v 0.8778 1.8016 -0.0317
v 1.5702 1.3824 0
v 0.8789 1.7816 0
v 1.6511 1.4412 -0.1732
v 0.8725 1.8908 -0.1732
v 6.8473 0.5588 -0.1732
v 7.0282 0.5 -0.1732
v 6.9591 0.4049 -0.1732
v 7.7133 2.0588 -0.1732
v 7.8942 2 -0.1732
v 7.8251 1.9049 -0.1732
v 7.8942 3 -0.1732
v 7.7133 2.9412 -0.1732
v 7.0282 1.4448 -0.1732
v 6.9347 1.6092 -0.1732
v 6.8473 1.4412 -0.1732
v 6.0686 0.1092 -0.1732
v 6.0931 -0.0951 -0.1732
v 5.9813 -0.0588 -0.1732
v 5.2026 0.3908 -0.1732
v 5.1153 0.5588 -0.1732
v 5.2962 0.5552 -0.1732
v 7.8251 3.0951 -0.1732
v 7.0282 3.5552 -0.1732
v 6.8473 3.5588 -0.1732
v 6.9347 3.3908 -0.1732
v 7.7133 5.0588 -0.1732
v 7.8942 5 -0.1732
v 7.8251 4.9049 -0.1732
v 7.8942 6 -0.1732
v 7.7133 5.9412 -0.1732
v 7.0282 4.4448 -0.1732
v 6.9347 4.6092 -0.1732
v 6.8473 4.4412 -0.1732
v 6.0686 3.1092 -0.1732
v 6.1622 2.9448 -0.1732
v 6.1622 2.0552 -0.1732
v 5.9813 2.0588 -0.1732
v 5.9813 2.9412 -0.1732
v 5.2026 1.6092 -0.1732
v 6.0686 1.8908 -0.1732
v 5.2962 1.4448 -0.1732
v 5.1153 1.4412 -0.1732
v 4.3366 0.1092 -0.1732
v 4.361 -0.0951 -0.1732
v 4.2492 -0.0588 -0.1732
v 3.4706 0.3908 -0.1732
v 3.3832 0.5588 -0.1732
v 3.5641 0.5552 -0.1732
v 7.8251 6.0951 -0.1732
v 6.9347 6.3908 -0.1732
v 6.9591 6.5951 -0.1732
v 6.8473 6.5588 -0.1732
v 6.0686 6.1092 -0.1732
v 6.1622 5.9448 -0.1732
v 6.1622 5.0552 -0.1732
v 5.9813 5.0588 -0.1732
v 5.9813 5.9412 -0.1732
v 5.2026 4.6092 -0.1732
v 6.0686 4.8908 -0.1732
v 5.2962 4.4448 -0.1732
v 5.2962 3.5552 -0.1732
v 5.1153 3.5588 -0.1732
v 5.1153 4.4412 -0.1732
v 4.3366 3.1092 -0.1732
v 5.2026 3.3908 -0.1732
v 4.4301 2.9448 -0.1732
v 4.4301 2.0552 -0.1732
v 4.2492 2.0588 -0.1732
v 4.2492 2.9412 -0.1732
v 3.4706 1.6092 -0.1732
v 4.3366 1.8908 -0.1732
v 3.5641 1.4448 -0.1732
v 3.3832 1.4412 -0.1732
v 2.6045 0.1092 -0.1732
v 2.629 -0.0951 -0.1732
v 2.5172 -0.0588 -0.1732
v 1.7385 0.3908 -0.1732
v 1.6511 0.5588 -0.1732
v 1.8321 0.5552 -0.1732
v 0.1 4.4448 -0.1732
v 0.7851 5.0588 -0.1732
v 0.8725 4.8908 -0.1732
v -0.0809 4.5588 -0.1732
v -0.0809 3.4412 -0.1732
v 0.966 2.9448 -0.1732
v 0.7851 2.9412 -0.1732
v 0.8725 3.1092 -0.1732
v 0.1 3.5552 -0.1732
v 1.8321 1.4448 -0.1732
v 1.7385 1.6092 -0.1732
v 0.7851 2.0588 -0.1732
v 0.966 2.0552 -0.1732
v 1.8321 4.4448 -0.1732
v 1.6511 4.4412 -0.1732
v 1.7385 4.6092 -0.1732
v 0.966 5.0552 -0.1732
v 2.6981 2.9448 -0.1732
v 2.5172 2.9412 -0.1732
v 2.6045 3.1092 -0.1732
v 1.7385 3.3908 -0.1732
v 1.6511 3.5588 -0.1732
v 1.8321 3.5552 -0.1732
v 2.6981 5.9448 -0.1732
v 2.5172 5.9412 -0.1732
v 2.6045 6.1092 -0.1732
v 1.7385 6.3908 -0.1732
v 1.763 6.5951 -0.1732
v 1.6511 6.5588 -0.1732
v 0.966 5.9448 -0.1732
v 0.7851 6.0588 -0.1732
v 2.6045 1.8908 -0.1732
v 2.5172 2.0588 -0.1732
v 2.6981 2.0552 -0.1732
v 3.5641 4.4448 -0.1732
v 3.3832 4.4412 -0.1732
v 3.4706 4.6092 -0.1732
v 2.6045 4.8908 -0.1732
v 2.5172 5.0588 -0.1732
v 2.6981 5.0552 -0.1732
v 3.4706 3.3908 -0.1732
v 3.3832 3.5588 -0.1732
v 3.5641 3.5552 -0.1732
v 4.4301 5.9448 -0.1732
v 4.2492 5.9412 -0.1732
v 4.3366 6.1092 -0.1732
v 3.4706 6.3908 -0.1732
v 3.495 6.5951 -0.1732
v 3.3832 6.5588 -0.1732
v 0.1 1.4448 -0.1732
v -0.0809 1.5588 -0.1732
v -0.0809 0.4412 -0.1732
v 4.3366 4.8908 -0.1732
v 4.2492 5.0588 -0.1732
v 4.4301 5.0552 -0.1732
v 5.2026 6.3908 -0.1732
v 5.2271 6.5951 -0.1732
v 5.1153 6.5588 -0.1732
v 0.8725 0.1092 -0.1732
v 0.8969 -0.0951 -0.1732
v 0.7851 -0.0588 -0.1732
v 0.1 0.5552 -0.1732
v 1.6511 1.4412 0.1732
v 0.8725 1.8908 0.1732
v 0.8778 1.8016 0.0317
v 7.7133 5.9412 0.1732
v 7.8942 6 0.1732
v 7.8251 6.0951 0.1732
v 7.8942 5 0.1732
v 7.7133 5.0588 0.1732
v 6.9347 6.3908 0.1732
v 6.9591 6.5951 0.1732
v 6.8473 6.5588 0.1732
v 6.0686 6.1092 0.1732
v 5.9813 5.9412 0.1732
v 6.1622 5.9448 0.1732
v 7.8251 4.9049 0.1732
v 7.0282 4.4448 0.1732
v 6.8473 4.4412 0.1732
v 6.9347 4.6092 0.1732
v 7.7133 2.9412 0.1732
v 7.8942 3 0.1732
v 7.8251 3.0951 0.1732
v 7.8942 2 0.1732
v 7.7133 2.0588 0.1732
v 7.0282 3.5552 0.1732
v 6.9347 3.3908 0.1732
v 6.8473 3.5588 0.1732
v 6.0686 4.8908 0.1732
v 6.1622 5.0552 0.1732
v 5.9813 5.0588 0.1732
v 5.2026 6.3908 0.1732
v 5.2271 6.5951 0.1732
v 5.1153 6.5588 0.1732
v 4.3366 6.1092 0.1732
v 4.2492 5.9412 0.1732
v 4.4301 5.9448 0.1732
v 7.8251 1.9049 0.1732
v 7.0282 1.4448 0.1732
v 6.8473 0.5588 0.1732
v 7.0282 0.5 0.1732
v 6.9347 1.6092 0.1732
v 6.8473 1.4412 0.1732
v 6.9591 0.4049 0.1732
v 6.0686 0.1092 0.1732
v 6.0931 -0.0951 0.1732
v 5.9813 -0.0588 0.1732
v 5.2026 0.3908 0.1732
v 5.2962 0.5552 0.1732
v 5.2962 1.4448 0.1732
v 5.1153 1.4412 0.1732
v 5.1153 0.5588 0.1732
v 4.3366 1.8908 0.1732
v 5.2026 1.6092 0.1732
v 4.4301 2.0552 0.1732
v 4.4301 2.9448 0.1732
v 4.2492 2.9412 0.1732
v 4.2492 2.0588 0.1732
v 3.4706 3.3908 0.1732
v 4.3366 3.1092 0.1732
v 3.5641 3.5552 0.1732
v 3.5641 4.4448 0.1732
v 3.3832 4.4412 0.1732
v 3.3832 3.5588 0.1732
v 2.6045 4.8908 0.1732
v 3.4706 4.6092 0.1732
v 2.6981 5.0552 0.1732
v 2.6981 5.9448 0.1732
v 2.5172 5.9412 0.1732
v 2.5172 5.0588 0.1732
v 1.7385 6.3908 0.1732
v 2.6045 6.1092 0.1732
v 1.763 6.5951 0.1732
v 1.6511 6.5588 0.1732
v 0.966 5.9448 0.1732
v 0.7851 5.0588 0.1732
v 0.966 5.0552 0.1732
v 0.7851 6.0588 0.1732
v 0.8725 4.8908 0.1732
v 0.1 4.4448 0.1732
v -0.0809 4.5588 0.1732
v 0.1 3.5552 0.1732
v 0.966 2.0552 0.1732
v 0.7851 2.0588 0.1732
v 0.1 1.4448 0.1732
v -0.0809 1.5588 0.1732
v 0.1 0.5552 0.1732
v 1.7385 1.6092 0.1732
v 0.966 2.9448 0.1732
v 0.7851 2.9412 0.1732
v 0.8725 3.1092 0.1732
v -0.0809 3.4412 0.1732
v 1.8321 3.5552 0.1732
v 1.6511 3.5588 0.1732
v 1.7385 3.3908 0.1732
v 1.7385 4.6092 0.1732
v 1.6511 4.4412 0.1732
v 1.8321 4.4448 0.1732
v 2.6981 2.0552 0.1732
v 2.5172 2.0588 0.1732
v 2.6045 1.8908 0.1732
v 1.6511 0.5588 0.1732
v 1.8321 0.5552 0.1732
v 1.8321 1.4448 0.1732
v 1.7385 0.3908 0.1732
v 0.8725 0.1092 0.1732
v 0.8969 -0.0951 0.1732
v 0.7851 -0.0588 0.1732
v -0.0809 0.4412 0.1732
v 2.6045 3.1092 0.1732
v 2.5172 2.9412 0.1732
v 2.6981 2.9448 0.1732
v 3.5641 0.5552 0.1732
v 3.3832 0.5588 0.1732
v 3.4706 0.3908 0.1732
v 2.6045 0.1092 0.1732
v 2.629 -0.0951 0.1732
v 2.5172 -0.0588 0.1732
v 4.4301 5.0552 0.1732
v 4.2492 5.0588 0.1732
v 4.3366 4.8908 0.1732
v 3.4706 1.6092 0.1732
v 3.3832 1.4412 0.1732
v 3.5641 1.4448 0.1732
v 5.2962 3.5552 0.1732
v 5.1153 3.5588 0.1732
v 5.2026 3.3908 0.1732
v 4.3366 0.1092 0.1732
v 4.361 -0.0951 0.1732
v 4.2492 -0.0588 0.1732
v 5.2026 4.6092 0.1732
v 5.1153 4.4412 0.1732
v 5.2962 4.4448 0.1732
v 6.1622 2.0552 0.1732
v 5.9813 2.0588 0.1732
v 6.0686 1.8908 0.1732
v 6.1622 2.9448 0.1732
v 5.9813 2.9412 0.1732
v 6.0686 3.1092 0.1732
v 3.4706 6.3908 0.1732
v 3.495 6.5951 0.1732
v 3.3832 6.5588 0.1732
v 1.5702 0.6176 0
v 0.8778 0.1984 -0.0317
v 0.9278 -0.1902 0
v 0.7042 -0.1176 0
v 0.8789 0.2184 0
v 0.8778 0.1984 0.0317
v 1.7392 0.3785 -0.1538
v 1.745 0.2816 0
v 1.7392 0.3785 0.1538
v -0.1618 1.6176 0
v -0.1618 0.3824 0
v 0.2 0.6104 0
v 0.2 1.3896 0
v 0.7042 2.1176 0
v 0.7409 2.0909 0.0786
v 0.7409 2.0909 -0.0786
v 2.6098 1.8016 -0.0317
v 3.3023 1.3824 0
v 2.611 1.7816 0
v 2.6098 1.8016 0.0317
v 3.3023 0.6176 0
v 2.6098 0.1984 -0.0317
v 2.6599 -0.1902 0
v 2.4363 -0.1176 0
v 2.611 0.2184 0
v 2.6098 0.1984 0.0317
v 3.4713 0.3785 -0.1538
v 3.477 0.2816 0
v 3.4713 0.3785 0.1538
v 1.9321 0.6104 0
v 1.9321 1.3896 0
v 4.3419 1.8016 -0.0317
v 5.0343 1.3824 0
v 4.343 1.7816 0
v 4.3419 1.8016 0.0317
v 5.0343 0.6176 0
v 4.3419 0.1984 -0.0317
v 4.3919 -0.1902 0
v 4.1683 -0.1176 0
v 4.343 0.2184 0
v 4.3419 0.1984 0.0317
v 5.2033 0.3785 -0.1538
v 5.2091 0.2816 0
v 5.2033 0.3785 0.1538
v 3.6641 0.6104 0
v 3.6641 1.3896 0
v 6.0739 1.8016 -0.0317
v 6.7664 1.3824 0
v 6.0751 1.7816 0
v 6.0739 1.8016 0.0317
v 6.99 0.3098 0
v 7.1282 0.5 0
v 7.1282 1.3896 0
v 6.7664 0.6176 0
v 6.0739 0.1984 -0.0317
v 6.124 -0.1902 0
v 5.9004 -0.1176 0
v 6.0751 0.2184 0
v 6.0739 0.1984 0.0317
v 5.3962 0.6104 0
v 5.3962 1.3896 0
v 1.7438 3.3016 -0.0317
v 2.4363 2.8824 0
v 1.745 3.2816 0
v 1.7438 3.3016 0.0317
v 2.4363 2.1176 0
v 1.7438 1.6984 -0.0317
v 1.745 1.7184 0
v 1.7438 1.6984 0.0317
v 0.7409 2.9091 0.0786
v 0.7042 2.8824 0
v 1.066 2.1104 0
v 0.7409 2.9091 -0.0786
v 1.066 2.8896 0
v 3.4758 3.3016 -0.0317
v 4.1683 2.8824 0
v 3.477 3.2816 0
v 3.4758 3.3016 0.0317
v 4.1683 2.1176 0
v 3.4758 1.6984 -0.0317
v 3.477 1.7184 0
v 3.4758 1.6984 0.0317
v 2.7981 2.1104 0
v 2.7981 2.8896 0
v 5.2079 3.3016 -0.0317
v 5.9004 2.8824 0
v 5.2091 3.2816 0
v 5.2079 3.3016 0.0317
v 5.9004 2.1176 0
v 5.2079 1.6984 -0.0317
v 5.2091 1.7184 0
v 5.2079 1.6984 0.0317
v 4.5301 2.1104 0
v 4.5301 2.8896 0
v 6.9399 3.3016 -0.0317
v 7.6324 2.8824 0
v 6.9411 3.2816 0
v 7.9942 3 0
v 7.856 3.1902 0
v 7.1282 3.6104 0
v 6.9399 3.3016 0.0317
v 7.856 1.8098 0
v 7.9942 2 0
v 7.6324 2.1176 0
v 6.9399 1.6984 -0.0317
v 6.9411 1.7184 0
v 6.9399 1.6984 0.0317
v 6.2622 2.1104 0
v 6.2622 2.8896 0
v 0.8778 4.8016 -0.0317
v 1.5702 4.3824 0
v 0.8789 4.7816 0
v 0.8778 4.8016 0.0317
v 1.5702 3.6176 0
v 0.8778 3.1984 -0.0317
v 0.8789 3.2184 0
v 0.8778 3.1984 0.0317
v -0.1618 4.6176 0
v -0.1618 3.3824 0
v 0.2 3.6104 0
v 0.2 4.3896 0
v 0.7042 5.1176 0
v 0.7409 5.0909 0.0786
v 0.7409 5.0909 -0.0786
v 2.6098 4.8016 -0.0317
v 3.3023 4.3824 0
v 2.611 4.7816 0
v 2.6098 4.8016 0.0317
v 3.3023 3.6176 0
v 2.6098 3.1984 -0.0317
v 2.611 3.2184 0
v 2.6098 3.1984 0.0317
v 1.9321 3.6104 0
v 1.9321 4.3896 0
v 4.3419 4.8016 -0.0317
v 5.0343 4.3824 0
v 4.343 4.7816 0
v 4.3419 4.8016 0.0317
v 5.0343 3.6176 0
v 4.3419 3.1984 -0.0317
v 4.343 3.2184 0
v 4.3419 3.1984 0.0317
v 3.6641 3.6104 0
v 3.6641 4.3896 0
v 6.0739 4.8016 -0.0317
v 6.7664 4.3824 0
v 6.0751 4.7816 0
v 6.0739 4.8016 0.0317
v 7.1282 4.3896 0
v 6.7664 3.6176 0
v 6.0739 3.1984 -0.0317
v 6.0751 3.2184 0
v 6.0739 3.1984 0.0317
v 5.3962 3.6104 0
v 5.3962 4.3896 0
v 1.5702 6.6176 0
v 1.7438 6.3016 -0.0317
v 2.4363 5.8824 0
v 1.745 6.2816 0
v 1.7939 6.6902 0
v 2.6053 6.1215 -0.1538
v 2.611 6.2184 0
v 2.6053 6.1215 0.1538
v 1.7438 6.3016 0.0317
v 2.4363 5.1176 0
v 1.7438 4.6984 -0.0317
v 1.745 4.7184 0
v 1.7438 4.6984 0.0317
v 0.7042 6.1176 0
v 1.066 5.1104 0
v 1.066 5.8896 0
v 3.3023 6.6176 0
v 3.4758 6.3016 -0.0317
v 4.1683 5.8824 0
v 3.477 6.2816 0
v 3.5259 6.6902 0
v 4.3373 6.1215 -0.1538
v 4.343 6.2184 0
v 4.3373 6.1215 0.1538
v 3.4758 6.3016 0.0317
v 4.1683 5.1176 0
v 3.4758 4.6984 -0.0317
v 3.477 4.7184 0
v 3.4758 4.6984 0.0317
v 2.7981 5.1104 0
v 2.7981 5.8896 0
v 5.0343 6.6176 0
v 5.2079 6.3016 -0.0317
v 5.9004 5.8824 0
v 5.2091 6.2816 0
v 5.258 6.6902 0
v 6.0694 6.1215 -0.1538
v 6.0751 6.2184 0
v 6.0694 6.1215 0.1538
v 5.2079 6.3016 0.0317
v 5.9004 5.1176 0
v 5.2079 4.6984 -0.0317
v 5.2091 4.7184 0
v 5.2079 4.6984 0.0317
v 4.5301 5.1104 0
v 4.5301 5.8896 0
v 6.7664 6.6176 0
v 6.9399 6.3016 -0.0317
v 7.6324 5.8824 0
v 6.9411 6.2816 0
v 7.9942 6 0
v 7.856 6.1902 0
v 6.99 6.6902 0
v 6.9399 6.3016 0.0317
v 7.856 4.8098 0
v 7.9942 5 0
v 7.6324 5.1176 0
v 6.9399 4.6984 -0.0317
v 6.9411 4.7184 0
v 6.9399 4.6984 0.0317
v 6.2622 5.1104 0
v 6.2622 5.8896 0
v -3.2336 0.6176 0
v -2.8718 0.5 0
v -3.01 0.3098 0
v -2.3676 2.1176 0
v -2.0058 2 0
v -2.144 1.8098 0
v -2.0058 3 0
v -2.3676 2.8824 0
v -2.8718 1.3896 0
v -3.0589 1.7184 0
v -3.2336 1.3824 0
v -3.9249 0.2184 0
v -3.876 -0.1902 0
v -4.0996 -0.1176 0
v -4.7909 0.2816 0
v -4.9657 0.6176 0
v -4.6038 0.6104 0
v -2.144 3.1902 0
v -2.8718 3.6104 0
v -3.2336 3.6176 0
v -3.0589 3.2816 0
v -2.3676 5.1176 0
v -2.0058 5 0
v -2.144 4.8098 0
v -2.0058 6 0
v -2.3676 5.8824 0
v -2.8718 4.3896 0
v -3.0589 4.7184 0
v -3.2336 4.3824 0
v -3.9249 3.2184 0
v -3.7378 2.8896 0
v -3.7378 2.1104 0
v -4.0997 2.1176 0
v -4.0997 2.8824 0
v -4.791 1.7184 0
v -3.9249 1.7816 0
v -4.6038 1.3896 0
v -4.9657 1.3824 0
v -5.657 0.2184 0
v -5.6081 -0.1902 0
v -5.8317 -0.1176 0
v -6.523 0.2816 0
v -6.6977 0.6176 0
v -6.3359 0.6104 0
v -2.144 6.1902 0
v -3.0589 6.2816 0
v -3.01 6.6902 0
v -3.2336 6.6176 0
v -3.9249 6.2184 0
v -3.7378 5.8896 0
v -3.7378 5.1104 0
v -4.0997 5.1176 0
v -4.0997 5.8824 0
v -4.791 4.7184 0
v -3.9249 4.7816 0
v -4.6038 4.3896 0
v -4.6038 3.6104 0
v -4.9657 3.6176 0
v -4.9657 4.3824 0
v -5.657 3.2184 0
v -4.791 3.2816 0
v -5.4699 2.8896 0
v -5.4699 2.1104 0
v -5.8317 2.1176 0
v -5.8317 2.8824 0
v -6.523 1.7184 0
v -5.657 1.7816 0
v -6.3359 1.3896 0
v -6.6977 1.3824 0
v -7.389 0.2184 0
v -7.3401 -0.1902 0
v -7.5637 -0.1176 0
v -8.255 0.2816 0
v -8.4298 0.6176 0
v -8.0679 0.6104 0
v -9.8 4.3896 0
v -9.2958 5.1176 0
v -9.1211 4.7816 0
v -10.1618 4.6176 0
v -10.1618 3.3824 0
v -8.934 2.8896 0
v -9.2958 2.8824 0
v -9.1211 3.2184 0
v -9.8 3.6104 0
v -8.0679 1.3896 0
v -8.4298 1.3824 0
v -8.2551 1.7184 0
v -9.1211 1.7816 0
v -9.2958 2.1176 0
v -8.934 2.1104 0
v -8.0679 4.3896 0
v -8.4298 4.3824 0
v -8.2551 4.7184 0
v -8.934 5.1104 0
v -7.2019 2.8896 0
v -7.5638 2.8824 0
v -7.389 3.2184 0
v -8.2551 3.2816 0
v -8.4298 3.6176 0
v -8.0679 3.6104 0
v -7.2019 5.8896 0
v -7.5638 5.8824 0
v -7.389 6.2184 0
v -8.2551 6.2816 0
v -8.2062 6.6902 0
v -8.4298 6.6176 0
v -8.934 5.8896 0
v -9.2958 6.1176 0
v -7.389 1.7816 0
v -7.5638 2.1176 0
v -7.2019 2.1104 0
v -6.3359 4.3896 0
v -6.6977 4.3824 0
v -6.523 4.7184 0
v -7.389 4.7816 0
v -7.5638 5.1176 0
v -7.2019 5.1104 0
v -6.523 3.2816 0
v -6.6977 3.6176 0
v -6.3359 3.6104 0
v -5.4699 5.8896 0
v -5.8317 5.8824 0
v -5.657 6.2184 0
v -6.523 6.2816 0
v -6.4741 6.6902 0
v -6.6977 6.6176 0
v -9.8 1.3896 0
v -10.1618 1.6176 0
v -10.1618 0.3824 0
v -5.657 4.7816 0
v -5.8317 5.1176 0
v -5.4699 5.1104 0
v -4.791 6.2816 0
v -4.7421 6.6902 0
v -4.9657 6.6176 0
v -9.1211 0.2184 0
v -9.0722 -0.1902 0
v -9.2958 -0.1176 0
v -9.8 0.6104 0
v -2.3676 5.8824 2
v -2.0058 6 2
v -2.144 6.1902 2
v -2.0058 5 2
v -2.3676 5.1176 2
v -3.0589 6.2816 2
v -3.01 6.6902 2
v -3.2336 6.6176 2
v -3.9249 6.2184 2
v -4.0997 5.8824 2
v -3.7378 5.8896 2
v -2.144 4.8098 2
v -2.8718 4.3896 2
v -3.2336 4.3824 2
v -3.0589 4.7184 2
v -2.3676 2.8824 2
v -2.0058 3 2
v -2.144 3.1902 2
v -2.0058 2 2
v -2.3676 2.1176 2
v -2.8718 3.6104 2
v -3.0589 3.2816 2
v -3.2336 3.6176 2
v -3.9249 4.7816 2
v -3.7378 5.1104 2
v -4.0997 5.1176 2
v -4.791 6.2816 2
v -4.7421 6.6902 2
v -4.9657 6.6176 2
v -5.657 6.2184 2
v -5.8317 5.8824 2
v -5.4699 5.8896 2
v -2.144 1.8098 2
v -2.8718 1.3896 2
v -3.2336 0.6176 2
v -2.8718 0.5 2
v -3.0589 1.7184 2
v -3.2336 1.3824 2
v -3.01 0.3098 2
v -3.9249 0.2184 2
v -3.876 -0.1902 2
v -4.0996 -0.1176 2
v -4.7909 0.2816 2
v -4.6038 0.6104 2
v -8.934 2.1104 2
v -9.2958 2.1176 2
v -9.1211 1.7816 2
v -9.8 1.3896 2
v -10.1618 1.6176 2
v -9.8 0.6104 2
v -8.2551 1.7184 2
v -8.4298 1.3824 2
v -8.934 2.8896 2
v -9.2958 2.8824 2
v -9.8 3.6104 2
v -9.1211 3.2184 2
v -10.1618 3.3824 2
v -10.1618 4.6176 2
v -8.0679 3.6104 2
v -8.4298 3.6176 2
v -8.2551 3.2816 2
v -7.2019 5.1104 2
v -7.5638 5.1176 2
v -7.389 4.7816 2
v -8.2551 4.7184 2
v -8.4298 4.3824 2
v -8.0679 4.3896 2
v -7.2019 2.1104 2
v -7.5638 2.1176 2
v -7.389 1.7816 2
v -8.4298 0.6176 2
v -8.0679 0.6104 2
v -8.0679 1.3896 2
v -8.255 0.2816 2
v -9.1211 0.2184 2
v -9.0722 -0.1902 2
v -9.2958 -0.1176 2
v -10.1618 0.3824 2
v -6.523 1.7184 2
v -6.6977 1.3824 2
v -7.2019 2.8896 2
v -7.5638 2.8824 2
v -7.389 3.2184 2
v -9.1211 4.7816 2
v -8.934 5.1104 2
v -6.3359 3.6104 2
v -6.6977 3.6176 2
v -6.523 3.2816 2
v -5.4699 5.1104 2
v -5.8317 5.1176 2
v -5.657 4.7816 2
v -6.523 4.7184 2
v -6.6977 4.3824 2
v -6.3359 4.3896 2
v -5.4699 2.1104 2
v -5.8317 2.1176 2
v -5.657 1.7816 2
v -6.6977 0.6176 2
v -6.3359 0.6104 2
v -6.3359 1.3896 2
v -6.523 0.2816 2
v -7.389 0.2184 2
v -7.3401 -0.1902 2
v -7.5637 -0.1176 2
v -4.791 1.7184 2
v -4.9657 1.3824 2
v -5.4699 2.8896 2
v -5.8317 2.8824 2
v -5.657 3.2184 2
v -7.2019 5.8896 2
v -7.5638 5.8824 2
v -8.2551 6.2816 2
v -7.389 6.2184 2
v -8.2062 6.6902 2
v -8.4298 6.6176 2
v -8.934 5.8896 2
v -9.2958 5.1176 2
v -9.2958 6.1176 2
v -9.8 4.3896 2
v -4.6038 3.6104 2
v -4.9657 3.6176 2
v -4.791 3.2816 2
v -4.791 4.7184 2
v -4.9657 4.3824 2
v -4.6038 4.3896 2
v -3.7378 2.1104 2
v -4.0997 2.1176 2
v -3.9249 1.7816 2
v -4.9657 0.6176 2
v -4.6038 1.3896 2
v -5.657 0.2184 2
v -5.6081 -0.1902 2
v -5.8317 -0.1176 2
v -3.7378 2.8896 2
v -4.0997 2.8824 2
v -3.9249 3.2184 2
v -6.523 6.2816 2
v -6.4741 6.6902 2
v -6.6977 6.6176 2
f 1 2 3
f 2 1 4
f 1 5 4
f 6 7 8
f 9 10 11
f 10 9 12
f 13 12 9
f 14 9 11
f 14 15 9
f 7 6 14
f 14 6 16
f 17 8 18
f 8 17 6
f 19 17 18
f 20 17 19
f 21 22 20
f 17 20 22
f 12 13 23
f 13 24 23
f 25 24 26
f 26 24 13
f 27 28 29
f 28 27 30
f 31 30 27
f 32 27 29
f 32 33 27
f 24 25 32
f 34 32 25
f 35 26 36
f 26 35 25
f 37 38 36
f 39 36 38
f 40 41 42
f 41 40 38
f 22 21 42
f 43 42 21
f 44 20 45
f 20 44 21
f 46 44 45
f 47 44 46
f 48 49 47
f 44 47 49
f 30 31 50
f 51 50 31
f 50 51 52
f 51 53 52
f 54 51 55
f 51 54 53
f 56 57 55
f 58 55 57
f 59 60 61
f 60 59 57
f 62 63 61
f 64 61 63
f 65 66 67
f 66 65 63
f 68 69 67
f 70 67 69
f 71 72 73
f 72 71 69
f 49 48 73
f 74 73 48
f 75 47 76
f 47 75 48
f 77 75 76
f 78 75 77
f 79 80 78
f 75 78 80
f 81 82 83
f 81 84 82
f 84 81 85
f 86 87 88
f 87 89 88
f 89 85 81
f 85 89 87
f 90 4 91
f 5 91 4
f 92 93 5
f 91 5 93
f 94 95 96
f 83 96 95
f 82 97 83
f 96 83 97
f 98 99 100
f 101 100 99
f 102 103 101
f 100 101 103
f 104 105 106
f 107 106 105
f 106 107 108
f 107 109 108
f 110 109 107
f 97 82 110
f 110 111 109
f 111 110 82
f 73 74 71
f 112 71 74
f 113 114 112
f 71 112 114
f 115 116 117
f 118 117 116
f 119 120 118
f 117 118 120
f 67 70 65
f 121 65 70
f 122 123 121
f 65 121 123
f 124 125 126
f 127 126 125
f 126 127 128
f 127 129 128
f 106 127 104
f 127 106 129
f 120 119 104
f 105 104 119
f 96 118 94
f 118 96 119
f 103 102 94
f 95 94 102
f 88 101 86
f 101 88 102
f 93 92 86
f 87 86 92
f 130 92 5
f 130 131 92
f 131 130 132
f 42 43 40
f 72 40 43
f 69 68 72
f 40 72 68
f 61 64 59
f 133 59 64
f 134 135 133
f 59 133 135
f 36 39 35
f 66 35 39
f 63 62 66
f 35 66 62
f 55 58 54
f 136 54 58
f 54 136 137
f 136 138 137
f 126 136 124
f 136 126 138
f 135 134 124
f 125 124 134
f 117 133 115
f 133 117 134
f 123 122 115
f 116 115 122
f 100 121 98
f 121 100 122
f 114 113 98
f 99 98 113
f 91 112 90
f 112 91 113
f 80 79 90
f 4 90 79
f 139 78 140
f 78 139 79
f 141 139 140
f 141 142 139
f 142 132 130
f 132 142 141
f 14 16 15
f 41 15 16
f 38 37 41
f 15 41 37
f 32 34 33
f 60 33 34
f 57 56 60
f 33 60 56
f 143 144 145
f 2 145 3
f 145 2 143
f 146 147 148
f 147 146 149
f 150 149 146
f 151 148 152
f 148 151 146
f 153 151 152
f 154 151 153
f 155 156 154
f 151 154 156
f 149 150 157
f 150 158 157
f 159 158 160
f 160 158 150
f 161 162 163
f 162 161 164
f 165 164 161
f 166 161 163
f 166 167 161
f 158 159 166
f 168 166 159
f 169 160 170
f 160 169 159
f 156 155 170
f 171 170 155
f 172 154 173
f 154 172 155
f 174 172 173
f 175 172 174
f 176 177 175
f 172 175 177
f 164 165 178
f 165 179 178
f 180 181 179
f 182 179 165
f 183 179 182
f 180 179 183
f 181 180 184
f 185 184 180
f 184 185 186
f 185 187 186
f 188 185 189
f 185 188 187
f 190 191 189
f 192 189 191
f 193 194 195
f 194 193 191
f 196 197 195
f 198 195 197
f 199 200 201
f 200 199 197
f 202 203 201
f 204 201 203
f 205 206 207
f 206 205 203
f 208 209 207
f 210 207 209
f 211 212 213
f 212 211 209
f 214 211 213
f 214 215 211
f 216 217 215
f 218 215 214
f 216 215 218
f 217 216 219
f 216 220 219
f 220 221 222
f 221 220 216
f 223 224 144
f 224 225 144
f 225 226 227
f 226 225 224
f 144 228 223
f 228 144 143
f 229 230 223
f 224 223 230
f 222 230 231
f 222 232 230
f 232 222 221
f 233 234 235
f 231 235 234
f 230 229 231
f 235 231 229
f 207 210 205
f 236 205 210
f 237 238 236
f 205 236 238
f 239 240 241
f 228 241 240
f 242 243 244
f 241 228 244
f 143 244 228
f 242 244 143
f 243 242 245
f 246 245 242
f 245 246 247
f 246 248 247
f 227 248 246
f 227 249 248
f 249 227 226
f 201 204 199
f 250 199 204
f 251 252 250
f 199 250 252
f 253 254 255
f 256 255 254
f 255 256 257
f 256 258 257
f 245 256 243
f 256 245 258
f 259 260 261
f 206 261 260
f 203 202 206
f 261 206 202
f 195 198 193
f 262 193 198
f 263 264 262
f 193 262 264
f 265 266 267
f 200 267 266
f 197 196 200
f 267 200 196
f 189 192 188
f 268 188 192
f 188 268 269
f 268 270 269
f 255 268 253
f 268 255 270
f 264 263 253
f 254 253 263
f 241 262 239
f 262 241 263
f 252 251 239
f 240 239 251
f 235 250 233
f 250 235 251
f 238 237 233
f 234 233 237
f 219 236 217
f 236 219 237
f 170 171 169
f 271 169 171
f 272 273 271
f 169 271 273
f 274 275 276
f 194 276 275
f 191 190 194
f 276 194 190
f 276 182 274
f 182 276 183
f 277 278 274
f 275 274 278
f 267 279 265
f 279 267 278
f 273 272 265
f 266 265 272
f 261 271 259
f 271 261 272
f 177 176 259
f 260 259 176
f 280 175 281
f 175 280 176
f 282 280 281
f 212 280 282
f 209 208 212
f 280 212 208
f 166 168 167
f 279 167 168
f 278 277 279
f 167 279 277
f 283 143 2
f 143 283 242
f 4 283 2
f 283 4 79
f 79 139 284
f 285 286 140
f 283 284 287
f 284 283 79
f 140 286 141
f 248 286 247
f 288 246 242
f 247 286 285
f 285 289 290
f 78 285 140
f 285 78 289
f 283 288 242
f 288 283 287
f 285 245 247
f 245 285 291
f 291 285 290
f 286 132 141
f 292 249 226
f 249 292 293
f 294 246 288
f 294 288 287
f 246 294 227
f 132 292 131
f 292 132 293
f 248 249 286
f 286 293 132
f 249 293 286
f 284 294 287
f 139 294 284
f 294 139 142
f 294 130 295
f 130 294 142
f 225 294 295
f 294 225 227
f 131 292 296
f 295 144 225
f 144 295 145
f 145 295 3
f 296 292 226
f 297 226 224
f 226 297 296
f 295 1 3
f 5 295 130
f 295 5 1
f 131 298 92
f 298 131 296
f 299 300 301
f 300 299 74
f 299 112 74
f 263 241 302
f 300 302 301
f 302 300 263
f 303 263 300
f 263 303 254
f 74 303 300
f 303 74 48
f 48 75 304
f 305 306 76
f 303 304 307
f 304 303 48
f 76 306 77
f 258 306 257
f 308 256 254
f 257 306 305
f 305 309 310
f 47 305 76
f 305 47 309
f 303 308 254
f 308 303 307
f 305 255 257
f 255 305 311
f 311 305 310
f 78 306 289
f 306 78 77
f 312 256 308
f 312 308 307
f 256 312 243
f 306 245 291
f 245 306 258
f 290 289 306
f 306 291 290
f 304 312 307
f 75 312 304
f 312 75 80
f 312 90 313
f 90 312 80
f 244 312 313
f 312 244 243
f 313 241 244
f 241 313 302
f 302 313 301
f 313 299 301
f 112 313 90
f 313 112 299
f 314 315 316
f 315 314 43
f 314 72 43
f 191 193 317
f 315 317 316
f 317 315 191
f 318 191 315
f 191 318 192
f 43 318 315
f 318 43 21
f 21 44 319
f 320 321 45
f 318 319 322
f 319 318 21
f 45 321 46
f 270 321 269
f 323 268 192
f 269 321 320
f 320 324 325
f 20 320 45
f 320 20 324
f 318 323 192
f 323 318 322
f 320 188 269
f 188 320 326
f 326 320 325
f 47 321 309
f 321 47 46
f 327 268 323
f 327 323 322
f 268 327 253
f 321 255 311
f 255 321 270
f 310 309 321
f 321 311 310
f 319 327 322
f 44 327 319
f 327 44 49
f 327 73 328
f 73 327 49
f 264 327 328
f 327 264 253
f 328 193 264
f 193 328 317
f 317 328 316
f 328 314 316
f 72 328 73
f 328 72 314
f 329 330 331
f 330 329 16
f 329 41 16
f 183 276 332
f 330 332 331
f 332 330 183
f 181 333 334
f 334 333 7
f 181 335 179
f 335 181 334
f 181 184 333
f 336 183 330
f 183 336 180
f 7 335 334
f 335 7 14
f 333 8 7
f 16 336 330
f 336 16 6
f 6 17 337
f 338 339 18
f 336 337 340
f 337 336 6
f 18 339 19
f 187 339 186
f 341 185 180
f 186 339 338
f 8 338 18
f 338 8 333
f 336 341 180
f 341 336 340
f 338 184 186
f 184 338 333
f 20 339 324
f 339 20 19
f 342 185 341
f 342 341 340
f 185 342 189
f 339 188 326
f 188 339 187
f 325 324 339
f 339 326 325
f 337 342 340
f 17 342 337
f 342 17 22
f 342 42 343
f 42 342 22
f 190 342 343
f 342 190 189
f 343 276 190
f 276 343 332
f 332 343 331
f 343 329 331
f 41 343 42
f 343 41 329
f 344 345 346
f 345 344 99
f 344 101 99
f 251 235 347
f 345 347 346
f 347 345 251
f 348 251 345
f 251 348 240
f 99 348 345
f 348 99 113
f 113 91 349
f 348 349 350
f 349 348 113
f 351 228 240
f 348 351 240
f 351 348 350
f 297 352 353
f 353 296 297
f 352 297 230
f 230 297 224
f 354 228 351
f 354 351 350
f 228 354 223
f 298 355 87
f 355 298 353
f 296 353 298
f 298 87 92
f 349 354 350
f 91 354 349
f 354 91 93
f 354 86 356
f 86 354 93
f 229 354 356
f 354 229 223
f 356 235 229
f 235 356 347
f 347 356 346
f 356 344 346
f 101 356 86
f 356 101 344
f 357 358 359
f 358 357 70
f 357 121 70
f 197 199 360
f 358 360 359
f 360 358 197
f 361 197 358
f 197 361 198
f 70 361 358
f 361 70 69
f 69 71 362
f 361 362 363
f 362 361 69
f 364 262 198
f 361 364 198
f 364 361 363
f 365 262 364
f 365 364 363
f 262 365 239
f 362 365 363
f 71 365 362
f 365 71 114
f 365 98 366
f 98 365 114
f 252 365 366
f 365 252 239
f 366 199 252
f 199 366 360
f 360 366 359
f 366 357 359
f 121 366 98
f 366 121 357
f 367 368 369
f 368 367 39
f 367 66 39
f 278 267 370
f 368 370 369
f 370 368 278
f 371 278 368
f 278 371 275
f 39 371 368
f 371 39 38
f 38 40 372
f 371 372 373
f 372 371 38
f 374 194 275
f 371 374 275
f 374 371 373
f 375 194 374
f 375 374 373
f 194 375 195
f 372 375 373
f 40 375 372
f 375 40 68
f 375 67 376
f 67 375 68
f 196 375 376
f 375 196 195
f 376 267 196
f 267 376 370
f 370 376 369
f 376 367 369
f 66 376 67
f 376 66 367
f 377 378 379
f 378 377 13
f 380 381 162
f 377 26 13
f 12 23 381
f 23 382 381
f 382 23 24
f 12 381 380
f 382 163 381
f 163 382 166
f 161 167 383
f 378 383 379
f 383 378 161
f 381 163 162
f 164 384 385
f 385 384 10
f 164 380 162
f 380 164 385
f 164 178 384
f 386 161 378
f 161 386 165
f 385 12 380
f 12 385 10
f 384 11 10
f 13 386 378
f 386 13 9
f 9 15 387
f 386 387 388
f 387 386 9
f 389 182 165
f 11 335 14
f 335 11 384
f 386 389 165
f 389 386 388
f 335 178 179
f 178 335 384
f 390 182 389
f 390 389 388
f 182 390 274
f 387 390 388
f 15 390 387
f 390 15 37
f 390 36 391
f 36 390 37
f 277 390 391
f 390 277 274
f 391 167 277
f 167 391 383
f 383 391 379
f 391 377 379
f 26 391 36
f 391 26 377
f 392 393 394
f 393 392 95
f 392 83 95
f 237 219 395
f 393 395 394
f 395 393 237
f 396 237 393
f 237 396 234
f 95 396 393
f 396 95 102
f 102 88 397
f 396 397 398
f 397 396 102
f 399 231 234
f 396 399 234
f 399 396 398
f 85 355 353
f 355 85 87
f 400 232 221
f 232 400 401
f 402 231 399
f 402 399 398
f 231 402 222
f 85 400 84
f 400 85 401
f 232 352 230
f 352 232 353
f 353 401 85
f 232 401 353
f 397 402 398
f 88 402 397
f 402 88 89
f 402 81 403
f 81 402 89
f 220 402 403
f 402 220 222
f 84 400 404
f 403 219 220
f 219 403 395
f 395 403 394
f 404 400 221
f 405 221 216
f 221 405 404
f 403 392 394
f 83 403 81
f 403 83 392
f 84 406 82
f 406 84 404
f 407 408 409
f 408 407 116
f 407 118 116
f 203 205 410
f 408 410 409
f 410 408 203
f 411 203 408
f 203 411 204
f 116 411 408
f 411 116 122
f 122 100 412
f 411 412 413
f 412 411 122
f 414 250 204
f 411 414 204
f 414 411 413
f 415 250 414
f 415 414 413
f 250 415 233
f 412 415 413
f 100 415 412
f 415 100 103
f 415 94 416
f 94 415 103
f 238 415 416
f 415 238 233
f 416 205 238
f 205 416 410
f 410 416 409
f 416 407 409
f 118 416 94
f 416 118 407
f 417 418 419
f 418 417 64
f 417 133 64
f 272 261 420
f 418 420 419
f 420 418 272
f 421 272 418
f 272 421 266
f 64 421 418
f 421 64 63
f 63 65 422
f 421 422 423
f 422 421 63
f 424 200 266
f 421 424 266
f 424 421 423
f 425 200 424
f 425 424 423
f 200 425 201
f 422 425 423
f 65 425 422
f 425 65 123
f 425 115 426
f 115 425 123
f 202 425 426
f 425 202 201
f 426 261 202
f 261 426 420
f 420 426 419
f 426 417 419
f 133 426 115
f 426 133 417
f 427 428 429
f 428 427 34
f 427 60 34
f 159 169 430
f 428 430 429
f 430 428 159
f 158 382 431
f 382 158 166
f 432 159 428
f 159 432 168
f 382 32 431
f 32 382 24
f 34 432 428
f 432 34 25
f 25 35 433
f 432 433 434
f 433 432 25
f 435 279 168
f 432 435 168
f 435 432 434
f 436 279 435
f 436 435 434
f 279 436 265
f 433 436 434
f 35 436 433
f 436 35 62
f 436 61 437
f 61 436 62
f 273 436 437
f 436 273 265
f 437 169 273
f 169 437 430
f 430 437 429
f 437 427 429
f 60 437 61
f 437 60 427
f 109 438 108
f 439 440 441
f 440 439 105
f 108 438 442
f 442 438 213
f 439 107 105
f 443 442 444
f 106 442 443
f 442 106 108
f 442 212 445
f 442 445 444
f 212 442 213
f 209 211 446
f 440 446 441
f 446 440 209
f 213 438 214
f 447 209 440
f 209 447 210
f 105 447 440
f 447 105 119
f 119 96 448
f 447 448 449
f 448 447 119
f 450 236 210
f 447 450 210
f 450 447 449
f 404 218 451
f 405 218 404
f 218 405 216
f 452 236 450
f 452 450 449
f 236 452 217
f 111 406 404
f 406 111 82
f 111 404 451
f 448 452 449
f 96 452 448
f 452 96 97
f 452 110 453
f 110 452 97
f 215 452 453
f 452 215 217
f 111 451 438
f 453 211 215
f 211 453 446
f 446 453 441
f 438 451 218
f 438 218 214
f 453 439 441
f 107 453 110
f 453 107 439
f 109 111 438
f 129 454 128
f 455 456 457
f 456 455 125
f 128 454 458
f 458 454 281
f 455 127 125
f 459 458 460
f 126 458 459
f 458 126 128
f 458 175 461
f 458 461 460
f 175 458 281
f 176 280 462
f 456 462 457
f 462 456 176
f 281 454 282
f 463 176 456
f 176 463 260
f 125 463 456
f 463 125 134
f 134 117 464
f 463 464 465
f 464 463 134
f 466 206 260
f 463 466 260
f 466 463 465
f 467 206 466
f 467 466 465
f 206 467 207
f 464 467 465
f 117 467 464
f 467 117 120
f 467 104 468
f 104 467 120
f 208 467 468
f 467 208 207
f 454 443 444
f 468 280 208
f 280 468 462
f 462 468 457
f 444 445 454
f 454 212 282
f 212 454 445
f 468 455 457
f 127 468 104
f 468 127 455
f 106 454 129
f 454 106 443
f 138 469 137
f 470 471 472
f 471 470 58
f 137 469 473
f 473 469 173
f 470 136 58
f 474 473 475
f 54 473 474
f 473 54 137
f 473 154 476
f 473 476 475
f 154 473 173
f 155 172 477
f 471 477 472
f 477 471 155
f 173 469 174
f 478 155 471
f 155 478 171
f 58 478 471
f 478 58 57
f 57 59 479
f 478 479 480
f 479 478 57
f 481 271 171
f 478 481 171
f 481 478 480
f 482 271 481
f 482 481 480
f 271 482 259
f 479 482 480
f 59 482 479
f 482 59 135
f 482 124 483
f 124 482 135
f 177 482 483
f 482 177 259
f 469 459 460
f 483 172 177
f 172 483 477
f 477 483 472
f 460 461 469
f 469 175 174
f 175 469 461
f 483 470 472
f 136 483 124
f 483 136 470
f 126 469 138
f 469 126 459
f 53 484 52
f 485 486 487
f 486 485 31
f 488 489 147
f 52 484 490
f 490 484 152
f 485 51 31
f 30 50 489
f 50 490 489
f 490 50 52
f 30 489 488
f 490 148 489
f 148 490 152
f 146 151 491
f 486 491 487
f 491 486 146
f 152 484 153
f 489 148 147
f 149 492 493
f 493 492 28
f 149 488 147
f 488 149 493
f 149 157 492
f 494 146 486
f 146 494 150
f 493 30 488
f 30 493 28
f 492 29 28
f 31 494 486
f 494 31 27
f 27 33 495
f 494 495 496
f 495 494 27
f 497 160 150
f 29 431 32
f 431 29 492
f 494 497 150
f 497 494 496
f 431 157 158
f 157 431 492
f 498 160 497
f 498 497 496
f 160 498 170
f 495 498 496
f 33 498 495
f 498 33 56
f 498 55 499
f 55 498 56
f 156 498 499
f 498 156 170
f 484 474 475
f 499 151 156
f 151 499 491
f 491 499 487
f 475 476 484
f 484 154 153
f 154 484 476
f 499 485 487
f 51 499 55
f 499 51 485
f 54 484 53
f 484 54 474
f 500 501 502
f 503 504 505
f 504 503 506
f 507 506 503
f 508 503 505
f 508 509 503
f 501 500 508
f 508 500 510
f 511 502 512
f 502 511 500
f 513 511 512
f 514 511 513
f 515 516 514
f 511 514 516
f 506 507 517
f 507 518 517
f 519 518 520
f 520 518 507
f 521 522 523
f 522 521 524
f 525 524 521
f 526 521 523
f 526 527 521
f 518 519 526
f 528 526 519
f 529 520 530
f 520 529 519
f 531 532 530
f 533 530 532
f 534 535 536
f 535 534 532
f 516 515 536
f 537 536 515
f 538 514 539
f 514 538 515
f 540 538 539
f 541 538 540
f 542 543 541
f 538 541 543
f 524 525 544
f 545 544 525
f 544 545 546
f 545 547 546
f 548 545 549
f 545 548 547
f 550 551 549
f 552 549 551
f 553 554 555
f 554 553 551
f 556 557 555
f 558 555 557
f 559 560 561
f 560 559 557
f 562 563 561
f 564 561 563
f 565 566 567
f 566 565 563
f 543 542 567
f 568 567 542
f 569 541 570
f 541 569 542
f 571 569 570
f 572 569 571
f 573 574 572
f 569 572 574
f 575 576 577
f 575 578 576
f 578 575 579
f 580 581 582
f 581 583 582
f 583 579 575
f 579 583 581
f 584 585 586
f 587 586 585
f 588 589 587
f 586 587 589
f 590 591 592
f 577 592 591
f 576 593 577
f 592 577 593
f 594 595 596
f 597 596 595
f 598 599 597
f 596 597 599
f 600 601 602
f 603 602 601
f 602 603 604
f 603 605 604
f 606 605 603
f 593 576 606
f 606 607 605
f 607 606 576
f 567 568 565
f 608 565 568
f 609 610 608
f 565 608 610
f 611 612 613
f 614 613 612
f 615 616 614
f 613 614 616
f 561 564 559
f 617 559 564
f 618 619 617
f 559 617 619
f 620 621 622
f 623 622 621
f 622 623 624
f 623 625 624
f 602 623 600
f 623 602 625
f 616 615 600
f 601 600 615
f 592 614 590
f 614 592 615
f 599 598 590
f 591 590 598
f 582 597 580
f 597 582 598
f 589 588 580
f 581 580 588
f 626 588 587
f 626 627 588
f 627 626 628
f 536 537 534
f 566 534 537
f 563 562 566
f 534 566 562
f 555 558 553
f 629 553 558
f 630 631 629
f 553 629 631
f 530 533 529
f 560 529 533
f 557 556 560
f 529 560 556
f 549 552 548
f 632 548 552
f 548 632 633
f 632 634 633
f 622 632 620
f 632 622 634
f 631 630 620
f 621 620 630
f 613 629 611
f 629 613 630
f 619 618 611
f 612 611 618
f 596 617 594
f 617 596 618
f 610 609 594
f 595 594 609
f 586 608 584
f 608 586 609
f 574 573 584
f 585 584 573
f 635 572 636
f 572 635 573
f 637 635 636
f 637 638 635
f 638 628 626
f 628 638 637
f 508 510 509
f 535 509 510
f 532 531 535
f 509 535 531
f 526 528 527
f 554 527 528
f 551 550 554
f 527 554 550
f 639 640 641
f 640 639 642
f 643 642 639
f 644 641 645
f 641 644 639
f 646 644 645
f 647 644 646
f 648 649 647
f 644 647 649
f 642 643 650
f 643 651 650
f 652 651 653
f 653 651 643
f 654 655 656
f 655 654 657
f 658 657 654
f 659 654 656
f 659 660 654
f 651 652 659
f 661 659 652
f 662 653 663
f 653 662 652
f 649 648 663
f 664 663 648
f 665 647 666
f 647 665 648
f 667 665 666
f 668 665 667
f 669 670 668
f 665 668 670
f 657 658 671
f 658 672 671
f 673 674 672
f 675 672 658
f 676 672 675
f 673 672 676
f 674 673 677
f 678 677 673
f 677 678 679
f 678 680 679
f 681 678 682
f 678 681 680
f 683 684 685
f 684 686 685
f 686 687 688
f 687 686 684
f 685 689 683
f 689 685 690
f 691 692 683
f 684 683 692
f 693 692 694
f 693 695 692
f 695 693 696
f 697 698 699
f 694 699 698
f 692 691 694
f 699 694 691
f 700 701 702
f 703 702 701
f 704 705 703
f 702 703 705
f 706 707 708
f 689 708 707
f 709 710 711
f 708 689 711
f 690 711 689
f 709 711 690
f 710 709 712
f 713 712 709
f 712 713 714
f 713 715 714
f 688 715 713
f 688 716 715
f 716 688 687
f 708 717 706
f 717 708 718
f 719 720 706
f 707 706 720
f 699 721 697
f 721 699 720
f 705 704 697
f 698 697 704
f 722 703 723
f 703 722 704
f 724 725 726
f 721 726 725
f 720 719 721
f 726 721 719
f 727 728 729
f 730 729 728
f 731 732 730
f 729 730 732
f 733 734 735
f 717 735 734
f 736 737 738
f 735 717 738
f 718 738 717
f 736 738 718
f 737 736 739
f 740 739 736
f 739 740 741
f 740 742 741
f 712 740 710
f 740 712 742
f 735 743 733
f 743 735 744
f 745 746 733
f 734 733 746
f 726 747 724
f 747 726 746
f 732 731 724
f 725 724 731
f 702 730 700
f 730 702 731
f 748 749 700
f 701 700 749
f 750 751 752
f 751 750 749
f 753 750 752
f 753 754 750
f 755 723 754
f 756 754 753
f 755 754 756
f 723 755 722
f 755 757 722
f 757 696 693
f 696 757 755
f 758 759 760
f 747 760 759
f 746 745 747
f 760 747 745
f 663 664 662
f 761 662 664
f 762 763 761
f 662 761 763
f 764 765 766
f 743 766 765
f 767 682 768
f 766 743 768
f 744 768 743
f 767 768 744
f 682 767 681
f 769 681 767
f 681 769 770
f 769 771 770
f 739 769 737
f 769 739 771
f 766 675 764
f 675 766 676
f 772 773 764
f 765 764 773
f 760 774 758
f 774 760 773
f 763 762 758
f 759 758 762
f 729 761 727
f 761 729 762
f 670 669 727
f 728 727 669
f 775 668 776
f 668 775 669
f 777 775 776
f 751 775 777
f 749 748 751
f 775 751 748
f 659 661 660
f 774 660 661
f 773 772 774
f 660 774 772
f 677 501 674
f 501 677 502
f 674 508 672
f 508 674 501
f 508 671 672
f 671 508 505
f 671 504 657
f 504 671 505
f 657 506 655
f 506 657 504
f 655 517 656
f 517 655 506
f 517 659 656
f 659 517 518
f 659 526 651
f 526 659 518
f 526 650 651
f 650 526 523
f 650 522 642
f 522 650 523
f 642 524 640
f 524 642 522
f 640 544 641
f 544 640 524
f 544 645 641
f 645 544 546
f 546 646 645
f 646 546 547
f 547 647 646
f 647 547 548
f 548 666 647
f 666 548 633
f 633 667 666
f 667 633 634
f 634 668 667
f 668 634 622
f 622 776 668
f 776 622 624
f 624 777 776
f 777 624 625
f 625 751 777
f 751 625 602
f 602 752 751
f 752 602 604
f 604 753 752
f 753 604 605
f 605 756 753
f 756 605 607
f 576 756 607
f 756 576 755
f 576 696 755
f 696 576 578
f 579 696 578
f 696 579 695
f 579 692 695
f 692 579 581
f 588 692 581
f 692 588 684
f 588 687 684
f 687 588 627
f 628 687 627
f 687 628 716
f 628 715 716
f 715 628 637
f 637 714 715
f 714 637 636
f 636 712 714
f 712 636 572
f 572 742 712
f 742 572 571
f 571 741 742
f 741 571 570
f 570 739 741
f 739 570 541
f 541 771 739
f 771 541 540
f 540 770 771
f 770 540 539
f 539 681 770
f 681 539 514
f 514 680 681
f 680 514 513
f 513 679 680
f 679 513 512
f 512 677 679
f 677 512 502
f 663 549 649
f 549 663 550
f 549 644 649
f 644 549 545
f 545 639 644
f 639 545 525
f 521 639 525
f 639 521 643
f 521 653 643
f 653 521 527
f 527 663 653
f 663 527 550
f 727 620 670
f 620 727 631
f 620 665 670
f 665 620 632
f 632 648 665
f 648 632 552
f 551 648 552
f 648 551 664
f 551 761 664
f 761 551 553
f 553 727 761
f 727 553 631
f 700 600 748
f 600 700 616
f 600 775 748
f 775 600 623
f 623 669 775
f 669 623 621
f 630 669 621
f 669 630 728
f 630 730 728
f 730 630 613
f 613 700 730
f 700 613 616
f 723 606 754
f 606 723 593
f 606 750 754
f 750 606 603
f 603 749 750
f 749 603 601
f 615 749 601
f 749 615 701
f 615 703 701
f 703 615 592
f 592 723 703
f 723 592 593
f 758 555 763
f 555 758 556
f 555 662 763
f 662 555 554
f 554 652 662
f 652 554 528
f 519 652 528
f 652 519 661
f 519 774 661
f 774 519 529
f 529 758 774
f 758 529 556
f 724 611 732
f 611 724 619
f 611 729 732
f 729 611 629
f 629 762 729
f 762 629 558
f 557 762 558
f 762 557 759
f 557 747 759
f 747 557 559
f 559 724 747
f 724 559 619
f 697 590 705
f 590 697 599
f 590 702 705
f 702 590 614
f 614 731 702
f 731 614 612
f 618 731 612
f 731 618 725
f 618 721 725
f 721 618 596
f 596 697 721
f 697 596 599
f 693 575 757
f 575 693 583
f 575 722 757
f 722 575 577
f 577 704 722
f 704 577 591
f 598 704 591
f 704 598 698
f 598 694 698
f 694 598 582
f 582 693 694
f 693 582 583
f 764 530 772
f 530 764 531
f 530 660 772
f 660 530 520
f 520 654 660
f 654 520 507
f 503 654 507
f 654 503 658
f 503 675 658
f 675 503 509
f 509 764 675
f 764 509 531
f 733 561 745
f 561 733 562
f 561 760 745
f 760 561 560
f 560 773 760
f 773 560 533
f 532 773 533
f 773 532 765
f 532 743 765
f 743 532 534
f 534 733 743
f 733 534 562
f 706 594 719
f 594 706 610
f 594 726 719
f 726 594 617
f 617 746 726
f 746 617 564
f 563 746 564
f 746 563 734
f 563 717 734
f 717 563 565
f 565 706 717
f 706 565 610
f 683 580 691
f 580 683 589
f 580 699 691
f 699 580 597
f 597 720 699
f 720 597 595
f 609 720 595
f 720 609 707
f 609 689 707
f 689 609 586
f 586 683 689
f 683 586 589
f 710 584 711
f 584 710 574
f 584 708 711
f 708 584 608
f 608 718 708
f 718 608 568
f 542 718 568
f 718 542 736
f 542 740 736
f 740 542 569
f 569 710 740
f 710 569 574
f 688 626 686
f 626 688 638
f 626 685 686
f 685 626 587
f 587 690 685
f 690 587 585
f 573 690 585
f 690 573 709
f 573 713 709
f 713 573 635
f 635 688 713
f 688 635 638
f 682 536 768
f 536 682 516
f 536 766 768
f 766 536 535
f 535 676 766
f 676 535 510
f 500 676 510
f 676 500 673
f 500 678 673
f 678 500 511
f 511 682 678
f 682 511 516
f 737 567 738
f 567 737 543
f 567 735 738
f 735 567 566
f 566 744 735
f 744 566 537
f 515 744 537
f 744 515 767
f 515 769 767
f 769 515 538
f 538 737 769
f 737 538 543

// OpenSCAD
module hexagon_frame(radius, edge_radius) {
    width=radius * cos(30);
    union() {
        hull() {
            translate([0, radius, 0]) sphere(edge_radius);
            translate([radius * cos(30), radius * sin(30), 0]) sphere(edge_radius);
        }
        hull() {
            translate([radius * cos(30), radius * sin(30), 0]) sphere(edge_radius);
            translate([radius * cos(30), -radius * sin(30), 0]) sphere(edge_radius);
        }
        hull() {
            translate([radius * cos(30), -radius * sin(30), 0]) sphere(edge_radius);
            translate([0, -radius, 0]) sphere(edge_radius);
        }
        hull() {
            translate([0, -radius, 0]) sphere(edge_radius);
            translate([-radius * cos(30), -radius * sin(30), 0]) sphere(edge_radius);
        }
        hull() {
            translate([-radius * cos(30), -radius * sin(30), 0]) sphere(edge_radius);
            translate([-radius * cos(30), radius * sin(30), 0]) sphere(edge_radius);

        }
        hull() {
            translate([-radius * cos(30), radius * sin(30), 0]) sphere(edge_radius);
            translate([0, radius, 0]) sphere(edge_radius);
        }
    }          
}
module hexagon_frame_plane(radius, edge_radius) {
    union() {
        hull() {
            translate([0, radius, 0]) circle(edge_radius);
            translate([radius * cos(30), radius * sin(30), 0]) circle(edge_radius);
        }
        hull() {
            translate([radius * cos(30), radius * sin(30), 0]) circle(edge_radius);
            translate([radius * cos(30), -radius * sin(30), 0]) circle(edge_radius);
        }
        hull() {
            translate([radius * cos(30), -radius * sin(30), 0]) circle(edge_radius);
            translate([0, -radius, 0]) circle(edge_radius);
        }
        hull() {
            translate([0, -radius, 0]) circle(edge_radius);
            translate([-radius * cos(30), -radius * sin(30), 0]) circle(edge_radius);
        }
        hull() {
            translate([-radius * cos(30), -radius * sin(30), 0]) circle(edge_radius);
            translate([-radius * cos(30), radius * sin(30), 0]) circle(edge_radius);

        }
        hull() {
            translate([-radius * cos(30), radius * sin(30), 0]) circle(edge_radius);
            translate([0, radius, 0]) circle(edge_radius);
        }
    }          
}
module hexagon_mesh(edge_count, unit_radius, edge_radius, center=false) {
    module hexagon_line(edge_count, unit_radius, edge_radius) {
        for(i = [0: edge_count-1]) {
            translate([unit_radius*cos(30)*2*i, 0, 0]) hexagon_frame(unit_radius, edge_radius);
        }
    }
    module hexagon_mesh_base(edge_count, unit_radius, edge_radius) {
        for (i = [0: edge_count-1]) {
            if (i % 2==1) {
                translate([unit_radius*cos(30),i*1.5*unit_radius,  0]) hexagon_line(edge_count, unit_radius, edge_radius);
            } else {
                translate([0,i*1.5*unit_radius, 0]) hexagon_line(edge_count, unit_radius, edge_radius);
            }
        }
    }
    if (center){
    } else {
        translate([cos(30)*unit_radius, unit_radius, 0]) hexagon_mesh_base(edge_count, unit_radius, edge_radius);
    }
}
module hexagon_mesh_plane(edge_count, unit_radius, edge_radius, center=false) {
    module hexagon_line(edge_count, unit_radius, edge_radius) {
        for(i = [0: edge_count-1]) {
            translate([unit_radius*cos(30)*2*i, 0, 0]) hexagon_frame_plane(unit_radius, edge_radius);
        }
    }
    module hexagon_mesh_base(edge_count, unit_radius, edge_radius) {
        for (i = [0: edge_count-1]) {
            if (i % 2==1) {
                translate([unit_radius*cos(30),i*1.5*unit_radius,  0]) hexagon_line(edge_count, unit_radius, edge_radius);
            } else {
                translate([0,i*1.5*unit_radius, 0]) hexagon_line(edge_count, unit_radius, edge_radius);
            }
        }
    }
    if (center){
    } else {
        translate([cos(30)*unit_radius, unit_radius, 0]) hexagon_mesh_base(edge_count, unit_radius, edge_radius);
    }
}
hexagon_mesh(4, 1, 0.2, false);
translate([-10, 0, 0]) linear_extrude(2) hexagon_mesh_plane(4, 1, 0.2, false);
